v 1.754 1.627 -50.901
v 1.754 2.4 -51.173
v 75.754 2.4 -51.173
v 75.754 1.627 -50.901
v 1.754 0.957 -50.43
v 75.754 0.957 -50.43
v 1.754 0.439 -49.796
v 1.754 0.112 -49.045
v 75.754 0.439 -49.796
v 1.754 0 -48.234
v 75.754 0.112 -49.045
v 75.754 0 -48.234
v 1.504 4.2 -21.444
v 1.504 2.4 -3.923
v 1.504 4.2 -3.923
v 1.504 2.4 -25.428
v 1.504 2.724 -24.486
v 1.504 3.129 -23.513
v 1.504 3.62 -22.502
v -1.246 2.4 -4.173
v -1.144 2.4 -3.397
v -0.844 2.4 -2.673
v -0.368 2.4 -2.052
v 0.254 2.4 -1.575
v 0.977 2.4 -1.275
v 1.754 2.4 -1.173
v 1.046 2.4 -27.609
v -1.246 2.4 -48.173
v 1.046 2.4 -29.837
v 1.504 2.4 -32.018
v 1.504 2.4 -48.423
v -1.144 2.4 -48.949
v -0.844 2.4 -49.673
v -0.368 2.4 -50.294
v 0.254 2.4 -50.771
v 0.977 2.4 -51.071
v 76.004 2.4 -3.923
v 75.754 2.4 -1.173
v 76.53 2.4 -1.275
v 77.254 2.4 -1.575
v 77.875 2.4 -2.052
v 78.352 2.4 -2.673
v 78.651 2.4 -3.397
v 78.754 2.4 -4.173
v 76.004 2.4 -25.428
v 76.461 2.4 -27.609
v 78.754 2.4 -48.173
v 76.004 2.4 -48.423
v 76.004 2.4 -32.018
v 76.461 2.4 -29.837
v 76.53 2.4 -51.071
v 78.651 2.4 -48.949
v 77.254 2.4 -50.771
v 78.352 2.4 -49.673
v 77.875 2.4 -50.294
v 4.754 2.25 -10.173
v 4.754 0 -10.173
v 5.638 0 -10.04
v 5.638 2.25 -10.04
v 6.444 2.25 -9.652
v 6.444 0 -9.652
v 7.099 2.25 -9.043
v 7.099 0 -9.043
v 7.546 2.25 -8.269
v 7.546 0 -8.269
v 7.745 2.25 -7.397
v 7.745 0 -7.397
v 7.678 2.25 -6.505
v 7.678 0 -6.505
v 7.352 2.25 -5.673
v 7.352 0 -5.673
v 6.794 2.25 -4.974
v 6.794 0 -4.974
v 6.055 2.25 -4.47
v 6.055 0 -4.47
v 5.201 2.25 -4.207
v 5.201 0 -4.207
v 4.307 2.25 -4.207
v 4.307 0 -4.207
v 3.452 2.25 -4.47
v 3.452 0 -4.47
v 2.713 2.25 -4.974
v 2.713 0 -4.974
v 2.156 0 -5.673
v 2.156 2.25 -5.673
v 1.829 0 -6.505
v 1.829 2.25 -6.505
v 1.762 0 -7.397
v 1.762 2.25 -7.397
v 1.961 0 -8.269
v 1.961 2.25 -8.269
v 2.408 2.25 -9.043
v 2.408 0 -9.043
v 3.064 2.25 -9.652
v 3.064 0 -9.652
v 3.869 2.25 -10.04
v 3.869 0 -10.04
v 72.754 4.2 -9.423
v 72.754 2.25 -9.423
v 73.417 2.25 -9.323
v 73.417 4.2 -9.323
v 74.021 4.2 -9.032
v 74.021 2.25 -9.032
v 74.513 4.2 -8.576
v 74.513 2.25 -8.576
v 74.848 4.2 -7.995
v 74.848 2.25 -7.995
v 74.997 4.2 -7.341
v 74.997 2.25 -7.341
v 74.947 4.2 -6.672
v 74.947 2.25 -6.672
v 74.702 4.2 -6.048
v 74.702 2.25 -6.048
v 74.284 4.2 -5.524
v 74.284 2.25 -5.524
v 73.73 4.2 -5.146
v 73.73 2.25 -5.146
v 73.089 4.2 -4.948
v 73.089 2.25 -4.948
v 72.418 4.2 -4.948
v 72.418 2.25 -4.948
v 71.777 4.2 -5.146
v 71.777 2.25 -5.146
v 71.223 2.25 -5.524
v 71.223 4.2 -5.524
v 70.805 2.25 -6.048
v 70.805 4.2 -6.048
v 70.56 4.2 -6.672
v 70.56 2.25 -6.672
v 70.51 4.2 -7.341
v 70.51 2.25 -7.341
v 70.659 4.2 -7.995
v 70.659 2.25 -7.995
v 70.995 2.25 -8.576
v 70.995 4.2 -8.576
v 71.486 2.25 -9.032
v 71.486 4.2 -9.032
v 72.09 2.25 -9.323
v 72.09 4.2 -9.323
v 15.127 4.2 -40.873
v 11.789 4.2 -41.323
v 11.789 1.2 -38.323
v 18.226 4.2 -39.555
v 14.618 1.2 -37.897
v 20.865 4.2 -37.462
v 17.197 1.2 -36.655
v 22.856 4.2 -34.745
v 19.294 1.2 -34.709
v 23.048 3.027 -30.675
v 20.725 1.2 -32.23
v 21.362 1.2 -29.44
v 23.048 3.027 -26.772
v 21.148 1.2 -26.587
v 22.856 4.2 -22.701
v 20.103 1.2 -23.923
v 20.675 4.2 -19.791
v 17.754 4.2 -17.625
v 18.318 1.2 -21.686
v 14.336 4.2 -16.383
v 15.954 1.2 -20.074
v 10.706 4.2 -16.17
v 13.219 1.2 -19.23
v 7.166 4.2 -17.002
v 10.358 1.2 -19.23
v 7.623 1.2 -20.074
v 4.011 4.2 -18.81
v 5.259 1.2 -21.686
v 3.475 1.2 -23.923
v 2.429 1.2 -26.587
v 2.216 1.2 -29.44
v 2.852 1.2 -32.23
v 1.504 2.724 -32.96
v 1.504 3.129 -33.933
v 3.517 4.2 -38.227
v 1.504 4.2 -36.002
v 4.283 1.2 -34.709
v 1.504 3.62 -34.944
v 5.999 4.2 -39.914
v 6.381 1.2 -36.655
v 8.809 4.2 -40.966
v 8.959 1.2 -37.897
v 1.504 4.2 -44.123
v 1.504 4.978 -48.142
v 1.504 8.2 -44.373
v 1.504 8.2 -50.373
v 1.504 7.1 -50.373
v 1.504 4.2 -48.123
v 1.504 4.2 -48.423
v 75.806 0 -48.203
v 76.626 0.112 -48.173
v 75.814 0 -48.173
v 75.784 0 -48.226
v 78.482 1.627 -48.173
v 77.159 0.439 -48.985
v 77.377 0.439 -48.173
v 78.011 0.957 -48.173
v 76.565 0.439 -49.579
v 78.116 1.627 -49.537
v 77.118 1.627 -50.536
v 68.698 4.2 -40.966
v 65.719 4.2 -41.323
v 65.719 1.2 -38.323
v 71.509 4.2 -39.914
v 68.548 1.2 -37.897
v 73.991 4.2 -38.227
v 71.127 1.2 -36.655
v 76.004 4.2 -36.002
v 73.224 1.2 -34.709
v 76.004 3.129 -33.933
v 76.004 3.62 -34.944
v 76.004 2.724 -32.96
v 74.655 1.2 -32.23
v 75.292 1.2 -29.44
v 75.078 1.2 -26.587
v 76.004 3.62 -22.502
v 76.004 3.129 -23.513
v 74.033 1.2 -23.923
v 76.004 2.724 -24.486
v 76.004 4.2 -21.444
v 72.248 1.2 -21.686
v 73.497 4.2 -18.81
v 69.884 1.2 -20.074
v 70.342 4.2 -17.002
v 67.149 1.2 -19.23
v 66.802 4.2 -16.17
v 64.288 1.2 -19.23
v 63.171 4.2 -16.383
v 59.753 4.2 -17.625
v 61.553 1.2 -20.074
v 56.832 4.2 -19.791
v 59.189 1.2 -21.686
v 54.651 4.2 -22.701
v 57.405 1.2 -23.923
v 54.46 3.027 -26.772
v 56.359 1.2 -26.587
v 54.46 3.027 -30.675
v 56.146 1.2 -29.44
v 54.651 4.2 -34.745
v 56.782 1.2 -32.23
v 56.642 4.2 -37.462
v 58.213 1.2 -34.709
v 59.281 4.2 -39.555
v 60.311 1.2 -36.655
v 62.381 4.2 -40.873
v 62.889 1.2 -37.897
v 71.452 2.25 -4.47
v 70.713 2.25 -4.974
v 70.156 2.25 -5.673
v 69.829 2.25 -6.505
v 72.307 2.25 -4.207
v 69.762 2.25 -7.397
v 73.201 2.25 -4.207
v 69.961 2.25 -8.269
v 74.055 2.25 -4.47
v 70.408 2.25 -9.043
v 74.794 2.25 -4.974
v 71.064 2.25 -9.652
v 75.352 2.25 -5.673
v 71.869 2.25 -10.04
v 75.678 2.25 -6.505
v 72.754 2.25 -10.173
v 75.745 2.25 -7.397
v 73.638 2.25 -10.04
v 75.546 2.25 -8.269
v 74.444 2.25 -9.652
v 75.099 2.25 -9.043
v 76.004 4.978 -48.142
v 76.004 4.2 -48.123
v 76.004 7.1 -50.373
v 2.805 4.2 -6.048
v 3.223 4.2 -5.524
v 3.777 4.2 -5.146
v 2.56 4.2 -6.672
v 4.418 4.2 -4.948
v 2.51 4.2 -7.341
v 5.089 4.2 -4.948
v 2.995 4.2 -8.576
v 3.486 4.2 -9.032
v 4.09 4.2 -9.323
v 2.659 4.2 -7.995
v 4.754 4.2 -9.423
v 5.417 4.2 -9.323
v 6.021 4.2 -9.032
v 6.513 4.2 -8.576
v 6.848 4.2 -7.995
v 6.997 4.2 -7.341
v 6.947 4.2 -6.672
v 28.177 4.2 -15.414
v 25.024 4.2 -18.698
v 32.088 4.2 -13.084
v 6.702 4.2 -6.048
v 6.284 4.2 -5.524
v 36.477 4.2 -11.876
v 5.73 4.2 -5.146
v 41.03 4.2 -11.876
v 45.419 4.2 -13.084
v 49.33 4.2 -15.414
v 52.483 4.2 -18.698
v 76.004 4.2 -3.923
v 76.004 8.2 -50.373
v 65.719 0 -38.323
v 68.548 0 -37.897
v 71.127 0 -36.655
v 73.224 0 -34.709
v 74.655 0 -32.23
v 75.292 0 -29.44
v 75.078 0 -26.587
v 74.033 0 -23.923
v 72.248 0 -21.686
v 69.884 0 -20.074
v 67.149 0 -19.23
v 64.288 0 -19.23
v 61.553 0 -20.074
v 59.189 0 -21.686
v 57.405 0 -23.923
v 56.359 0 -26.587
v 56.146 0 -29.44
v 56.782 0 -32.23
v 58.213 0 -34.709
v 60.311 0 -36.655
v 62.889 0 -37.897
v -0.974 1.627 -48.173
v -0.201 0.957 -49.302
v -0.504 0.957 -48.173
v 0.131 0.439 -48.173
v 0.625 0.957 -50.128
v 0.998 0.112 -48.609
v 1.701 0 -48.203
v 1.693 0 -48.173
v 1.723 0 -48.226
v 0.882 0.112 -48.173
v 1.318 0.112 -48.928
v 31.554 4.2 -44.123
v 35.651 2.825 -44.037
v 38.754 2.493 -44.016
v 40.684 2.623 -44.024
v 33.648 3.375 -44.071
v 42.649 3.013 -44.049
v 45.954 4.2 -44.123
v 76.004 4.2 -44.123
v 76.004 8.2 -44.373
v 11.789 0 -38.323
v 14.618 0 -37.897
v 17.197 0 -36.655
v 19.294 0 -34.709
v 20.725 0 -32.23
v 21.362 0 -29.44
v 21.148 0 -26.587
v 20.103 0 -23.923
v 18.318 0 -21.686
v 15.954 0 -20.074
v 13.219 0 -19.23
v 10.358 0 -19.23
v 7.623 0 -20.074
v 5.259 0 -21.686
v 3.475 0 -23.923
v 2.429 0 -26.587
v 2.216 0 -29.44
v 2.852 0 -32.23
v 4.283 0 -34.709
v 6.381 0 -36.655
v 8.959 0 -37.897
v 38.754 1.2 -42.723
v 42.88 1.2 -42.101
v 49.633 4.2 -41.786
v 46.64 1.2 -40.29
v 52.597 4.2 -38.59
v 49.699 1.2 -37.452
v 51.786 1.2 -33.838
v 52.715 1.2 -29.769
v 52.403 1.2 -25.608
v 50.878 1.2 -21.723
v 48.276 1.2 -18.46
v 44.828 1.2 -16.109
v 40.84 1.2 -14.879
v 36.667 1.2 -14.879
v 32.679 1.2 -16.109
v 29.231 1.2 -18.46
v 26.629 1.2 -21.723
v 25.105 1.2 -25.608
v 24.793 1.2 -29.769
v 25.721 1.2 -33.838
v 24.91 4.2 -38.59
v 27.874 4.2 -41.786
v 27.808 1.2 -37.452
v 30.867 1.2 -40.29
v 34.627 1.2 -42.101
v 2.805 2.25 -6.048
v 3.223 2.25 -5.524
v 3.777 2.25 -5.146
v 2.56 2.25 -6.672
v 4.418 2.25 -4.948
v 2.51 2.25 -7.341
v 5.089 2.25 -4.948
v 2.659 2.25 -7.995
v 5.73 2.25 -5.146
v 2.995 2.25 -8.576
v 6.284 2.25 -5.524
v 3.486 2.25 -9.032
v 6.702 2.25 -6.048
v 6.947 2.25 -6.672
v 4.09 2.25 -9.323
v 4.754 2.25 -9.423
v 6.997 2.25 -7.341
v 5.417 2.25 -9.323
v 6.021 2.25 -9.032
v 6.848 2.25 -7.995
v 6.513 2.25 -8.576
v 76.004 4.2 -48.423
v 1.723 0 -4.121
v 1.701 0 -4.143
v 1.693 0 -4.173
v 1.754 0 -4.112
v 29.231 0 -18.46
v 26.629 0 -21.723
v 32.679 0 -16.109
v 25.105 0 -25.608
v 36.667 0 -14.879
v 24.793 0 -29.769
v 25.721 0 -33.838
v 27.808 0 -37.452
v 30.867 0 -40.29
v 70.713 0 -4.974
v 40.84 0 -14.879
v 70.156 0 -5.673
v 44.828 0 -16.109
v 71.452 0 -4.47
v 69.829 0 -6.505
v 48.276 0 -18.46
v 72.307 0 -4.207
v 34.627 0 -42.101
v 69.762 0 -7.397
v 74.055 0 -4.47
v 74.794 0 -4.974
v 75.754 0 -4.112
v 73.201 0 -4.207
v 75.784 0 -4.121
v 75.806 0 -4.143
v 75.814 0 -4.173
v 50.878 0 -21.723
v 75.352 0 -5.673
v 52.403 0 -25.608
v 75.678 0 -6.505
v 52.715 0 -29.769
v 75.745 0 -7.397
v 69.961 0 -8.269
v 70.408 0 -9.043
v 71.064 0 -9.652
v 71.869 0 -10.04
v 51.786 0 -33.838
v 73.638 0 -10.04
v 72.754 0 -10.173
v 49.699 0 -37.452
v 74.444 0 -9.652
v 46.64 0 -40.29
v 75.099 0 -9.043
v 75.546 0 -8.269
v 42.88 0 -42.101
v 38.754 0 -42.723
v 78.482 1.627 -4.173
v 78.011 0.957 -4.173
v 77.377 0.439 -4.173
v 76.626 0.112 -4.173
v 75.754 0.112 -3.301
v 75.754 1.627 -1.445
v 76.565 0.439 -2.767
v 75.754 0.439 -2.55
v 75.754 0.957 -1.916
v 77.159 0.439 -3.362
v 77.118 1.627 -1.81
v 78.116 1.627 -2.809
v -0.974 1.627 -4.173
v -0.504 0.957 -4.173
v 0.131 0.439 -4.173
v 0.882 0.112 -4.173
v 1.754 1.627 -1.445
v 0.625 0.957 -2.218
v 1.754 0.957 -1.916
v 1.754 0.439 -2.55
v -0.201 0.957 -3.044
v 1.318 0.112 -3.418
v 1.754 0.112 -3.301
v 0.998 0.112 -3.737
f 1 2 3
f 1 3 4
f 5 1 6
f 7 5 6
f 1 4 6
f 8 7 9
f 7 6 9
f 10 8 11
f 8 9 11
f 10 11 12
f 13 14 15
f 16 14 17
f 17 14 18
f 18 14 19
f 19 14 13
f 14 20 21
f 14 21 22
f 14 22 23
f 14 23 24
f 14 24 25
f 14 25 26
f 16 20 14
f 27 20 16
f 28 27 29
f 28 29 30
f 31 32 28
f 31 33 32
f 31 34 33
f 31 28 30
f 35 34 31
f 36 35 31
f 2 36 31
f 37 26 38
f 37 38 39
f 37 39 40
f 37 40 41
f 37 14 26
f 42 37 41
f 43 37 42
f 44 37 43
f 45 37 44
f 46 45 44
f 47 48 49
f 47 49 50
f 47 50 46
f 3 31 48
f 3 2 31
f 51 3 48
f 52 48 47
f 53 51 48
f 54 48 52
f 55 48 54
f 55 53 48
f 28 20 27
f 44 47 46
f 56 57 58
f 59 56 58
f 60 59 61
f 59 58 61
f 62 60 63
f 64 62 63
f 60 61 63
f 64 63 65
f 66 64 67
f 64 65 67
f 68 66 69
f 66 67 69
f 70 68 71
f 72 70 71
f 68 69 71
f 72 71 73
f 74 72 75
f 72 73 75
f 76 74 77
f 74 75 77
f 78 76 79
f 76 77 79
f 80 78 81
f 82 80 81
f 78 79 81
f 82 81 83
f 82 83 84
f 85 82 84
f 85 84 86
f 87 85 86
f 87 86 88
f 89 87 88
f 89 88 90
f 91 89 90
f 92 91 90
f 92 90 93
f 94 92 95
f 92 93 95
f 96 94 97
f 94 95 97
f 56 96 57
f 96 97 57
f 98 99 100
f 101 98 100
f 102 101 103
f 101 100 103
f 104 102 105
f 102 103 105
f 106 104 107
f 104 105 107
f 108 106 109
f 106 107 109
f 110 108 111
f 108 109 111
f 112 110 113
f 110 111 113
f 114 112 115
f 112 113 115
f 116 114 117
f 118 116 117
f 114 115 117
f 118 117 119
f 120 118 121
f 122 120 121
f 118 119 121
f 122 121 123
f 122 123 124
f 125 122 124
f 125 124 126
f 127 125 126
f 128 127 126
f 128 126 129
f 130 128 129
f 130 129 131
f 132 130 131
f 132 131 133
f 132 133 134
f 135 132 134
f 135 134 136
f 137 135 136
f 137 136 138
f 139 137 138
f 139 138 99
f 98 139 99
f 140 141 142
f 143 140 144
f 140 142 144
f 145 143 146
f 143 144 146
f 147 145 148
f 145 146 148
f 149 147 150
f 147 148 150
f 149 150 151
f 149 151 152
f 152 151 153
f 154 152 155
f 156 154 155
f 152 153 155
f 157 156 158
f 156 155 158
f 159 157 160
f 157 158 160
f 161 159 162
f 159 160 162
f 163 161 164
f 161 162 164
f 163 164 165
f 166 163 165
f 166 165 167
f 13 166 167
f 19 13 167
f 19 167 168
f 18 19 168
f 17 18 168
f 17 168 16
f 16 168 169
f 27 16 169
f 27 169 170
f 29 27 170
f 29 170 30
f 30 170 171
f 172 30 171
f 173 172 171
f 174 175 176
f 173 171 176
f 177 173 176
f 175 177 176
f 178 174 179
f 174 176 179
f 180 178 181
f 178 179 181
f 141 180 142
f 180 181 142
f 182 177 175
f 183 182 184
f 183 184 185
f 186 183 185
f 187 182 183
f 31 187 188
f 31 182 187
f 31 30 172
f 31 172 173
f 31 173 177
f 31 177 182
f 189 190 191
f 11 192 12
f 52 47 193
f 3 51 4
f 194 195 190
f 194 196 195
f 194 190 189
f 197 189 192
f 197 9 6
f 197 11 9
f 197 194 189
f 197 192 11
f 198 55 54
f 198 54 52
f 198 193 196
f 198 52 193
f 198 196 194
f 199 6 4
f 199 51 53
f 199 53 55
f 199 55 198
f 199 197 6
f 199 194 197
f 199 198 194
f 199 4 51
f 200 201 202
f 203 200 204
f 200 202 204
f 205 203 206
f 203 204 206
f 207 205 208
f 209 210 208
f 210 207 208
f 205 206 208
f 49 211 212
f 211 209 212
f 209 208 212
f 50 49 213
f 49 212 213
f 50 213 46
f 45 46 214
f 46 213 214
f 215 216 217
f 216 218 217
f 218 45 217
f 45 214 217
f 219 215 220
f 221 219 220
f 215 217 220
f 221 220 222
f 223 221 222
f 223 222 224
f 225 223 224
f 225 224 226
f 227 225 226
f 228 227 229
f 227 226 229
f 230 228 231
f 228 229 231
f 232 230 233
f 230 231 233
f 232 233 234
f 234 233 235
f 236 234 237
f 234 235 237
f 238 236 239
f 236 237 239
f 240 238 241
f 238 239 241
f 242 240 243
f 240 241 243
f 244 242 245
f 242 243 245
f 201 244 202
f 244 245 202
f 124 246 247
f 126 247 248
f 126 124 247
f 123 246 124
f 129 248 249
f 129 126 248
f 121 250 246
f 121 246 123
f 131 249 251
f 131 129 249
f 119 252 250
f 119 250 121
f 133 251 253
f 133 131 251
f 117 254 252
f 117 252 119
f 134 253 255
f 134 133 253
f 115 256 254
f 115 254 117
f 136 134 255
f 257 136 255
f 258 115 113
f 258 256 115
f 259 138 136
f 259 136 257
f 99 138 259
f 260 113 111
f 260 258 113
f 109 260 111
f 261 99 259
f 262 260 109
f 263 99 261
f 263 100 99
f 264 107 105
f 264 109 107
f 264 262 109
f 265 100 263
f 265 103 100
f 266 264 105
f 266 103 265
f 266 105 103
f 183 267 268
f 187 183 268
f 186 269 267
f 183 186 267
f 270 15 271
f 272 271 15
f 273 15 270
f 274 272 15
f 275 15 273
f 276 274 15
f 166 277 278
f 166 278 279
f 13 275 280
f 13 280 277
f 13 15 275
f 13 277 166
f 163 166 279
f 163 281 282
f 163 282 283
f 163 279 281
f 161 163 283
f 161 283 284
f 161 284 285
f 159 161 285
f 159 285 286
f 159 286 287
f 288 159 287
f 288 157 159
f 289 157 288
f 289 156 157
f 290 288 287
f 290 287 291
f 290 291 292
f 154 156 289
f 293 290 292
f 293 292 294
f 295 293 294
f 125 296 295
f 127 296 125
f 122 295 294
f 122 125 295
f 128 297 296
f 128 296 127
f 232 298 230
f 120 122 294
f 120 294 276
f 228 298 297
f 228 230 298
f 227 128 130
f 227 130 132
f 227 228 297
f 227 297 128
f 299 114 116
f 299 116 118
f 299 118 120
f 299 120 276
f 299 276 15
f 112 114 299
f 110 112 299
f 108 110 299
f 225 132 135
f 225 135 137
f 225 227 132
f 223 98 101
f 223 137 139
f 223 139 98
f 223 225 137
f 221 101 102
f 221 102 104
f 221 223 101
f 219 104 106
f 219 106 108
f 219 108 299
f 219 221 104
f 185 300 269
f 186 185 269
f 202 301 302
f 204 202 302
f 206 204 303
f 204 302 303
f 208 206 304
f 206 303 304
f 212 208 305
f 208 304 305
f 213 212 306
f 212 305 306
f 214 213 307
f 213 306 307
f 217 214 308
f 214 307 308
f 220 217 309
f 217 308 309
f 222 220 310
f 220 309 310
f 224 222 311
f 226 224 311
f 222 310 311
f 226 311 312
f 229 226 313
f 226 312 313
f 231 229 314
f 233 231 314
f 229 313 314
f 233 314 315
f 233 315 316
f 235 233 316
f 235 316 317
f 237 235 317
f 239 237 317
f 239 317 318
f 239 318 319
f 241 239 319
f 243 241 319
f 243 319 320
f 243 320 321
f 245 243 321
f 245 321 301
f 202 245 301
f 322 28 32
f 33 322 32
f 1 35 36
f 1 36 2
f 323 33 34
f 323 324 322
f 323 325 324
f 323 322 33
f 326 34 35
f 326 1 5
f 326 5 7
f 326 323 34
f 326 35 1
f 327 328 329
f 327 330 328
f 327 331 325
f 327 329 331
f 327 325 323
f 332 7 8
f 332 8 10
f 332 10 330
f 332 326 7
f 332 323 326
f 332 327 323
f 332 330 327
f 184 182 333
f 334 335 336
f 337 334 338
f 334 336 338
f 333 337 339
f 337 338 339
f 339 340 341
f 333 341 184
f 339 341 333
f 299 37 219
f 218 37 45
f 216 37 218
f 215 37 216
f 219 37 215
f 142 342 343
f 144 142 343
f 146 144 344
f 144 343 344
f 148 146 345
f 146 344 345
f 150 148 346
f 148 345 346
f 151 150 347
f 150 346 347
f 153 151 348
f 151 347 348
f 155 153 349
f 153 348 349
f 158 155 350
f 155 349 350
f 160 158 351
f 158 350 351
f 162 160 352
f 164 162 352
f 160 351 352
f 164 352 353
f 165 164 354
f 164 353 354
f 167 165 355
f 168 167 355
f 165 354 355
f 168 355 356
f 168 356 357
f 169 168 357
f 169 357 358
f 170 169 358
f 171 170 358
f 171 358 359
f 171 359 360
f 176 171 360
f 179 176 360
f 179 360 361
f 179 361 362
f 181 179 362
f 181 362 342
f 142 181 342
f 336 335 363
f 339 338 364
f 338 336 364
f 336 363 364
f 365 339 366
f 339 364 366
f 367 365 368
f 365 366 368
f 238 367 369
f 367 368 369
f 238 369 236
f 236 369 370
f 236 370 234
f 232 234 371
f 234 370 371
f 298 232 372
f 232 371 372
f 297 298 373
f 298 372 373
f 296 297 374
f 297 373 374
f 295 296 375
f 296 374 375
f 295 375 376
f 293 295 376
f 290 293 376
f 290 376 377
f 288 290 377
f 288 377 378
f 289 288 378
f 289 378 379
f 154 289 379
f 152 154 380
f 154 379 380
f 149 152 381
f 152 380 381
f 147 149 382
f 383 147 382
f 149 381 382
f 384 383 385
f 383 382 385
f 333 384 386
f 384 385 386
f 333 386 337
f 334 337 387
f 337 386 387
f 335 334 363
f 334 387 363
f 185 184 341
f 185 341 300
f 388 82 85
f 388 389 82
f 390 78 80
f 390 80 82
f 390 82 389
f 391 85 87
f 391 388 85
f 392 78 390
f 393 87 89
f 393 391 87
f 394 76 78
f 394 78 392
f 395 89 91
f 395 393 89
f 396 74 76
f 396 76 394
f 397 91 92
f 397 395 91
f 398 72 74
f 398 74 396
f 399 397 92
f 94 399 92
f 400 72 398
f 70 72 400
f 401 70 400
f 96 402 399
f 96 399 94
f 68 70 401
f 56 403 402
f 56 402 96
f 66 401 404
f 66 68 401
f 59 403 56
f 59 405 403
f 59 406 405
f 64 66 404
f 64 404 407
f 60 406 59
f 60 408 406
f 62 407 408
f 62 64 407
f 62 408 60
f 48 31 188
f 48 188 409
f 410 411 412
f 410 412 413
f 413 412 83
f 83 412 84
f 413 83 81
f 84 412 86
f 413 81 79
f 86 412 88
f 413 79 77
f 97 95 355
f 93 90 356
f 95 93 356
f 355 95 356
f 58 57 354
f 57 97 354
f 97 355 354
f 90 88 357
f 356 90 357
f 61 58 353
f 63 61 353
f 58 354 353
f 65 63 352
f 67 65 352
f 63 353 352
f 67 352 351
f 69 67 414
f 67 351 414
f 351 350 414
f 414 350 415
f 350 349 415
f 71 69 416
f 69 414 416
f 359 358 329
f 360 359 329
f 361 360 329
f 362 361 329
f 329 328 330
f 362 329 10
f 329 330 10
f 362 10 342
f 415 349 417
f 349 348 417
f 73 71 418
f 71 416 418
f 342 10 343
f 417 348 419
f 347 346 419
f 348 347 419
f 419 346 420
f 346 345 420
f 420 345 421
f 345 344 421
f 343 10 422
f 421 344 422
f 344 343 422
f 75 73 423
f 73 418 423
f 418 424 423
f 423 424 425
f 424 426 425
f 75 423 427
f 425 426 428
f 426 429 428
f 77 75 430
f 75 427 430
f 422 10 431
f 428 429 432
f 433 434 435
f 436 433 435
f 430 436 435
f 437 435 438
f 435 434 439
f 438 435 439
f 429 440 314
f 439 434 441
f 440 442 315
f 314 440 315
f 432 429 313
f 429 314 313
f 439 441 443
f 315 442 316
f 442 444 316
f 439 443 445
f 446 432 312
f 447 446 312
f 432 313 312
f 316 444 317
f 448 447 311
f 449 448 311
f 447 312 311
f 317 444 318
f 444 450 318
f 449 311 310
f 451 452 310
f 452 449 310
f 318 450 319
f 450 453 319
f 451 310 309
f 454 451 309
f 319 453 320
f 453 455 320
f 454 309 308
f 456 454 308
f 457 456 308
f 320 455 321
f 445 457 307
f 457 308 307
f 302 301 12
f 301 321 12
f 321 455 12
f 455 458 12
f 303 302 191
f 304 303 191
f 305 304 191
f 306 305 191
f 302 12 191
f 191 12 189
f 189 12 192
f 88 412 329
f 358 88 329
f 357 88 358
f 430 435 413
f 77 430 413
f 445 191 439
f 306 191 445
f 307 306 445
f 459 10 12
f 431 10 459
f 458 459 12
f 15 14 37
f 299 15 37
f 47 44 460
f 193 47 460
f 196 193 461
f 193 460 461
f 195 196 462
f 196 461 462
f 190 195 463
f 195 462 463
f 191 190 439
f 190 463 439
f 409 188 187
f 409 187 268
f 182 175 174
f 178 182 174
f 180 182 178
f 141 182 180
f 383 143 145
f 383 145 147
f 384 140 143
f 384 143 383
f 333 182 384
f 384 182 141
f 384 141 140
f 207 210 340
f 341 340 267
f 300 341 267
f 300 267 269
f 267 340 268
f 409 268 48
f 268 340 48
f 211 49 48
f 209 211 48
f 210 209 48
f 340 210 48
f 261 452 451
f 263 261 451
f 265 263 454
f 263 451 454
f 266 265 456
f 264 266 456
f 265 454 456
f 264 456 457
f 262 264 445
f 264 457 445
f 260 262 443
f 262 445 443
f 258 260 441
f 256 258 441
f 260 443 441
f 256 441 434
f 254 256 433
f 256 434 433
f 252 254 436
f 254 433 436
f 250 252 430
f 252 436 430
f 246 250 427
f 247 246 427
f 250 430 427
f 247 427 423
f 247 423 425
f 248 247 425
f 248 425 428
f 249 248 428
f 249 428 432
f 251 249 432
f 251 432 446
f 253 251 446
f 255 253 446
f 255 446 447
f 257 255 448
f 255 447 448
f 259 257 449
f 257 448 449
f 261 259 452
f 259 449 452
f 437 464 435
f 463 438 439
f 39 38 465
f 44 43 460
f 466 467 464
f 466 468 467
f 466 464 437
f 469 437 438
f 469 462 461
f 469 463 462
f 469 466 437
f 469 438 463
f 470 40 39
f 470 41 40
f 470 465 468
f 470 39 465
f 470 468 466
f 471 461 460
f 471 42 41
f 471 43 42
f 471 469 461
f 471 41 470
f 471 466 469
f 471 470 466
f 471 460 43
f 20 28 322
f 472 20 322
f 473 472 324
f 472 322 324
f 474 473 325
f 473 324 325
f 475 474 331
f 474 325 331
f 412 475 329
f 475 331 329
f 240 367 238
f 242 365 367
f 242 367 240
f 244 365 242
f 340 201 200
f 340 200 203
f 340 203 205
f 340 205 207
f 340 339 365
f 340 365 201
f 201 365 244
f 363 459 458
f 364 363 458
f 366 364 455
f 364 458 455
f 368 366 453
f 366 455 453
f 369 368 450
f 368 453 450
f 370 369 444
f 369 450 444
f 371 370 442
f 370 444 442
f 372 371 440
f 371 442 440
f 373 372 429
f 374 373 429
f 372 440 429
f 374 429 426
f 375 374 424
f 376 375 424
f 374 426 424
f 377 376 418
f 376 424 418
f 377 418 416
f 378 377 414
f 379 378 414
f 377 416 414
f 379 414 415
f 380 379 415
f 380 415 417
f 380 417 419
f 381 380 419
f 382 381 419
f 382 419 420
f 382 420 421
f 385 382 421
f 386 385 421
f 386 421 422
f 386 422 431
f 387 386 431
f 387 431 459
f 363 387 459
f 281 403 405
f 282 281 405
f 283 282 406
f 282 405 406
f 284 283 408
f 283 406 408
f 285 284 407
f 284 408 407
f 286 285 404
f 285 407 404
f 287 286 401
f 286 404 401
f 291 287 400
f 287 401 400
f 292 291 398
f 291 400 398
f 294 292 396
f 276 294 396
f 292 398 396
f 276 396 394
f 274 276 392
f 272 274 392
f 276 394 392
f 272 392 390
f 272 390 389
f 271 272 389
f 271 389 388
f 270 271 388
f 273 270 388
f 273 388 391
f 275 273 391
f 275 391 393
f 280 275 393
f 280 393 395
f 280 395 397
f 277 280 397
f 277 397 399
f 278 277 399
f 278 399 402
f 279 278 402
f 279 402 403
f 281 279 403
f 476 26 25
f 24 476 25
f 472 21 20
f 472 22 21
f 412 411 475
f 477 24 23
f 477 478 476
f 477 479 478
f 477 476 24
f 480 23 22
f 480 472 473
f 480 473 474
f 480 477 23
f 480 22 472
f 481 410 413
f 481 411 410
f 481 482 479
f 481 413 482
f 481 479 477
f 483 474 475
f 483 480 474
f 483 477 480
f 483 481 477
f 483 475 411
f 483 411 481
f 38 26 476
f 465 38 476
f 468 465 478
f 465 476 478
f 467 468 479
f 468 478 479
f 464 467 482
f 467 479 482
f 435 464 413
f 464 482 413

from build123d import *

# Parameters (mm, degrees)
SKETCH1_W           = 80
SKETCH1_H           = 50
BOSS_EXTRUDE1_DEPTH = 2.4
SKETCH2_W           = 74.5
SKETCH2_H           = 44.5
BOSS_EXTRUDE2_DEPTH = 1.8
SKETCH4_R           = 9.6
SKETCH4_R_2         = 14
SKETCH4_R_3         = 2.25
CUT_EXTRUDE1_DEPTH  = 95.013072971
BOSS_EXTRUDE3_DEPTH = 74.5
FILLET1_R           = 3
FILLET2_R           = 3
SKETCH7_R           = 3
CUT_EXTRUDE3_DEPTH  = 2.25
CHAMFER1_SIZE       = 3


with BuildPart() as part:
    # Sketch1 → Boss-Extrude1 (new body)
    with BuildSketch(Plane(origin=(0, 0, 0), x_dir=(1, 0, 0), z_dir=(0, 1, 0))):
        with Locations((38.753665689, 26.173020528)):
            Rectangle(SKETCH1_W, SKETCH1_H)
    extrude(amount=BOSS_EXTRUDE1_DEPTH)

    # Sketch2 → Boss-Extrude2 (add)
    with BuildSketch(Plane(origin=(0, 2.4, 0), x_dir=(1, 0, 0), z_dir=(0, 1, 0))):
        with Locations((38.753665689, 26.173020528)):
            Rectangle(SKETCH2_W, SKETCH2_H)
    extrude(amount=BOSS_EXTRUDE2_DEPTH)

    # Sketch4 → Cut-Extrude1 (cut, through all)
    with BuildSketch(Plane(origin=(0, 0, 0), x_dir=(-1, 0, 0), z_dir=(0, -1, 0))):
        with Locations(Location((-65.718665689, 28.723020528, 0), (0, 0, 90))):
            Circle(SKETCH4_R)
        with Locations(Location((-38.753665689, 28.723020528, 0), (0, 0, 90))):
            Circle(SKETCH4_R_2)
        with Locations(Location((-11.788665689, 28.723020528, 0), (0, 0, 90))):
            Circle(SKETCH4_R)
        with Locations(Location((-72.753665689, 7.173020528, 0), (0, 0, 90))):
            Circle(SKETCH4_R_3)
        with Locations(Location((-4.753665689, 7.173020528, 0), (0, 0, 90))):
            Circle(SKETCH4_R_3)
    extrude(amount=-CUT_EXTRUDE1_DEPTH, mode=Mode.SUBTRACT)

    # Sketch5 → Boss-Extrude3 (add)
    with BuildSketch(Plane(origin=(76.003665689, 0, 0), x_dir=(0, 0, -1), z_dir=(1, 0, 0))):
        Polygon((48.123020528, 4.2), (44.123020528, 4.2), (44.373020528, 8.2), (50.373020528, 8.2), (50.373020528, 7.1), (48.142477117, 4.978263585), align=None)
    extrude(amount=-BOSS_EXTRUDE3_DEPTH)

    # Fillet1
    fillet1_edges = [part.edges().sort_by_distance(p)[0] for p in [
        (-1.246334311, 1.2, -51.173020528),
        (78.753665689, 1.2, -51.173020528),
        (78.753665689, 1.2, -1.173020528),
        (-1.246334311, 1.2, -1.173020528),
    ]]
    fillet(fillet1_edges, radius=FILLET1_R)

    # Fillet2
    # the kernel refuses this fillet: 3 mm, written as the material it takes off along each edge
    with BuildSketch(Plane(origin=(1.753665689, 0, -48.173020528), x_dir=(-1, 0, 0), z_dir=(0, 0, 1))) as fillet2_piece_1:
        with BuildLine():
            CenterArc((0.060612309, -3), FILLET2_R, 11.536959033, 78.463040967)
            Line((3, -2.4), (3.058787754, -2.388))
            ThreePointArc((3.058787754, -2.388), (3.06, -1.2), (3.06, 0))
            Line((3.06, 0), (3, 0.06))
            Line((3, 0.06), (0.060612309, 0.06))
            Line((0.060612309, 0.06), (0.060612309, 0))
        make_face()
    revolve(axis=Axis((1.753665689, 0, -48.173020528), (0, -1, 0)), revolution_arc=90, mode=Mode.SUBTRACT)
    with BuildSketch(Plane(origin=(75.753665689, 0, -51.173020528), x_dir=(0, 0, 1), z_dir=(-1, 0, 0))) as fillet2_piece_2:
        with BuildLine():
            CenterArc((2.939387691, 3), FILLET2_R, 191.536959033, 78.463040967)
            Line((0, 2.4), (-0.058787754, 2.388))
            ThreePointArc((-0.058787754, 2.388), (-0.06, 1.2), (-0.06, 0))
            Line((-0.06, 0), (0, -0.06))
            Line((0, -0.06), (2.939387691, -0.06))
            Line((2.939387691, -0.06), (2.939387691, 0))
        make_face()
    extrude(amount=74, mode=Mode.SUBTRACT)
    with BuildSketch(Plane(origin=(75.753665689, 0, -48.173020528), x_dir=(1, 0, 0), z_dir=(0, 0, 1))) as fillet2_piece_3:
        with BuildLine():
            CenterArc((0.060612309, 3), FILLET2_R, 270, 78.463040967)
            Line((3, 2.4), (3.058787754, 2.388))
            ThreePointArc((3.058787754, 2.388), (3.06, 1.2), (3.06, 0))
            Line((3.06, 0), (3, -0.06))
            Line((3, -0.06), (0.060612309, -0.06))
            Line((0.060612309, -0.06), (0.060612309, 0))
        make_face()
    revolve(axis=Axis((75.753665689, 0, -48.173020528), (0, 1, 0)), revolution_arc=90, mode=Mode.SUBTRACT)
    with BuildSketch(Plane(origin=(78.753665689, 0, -4.173020528), x_dir=(-1, 0, 0), z_dir=(0, 0, -1)), Plane(origin=(-1.246334311, 0, -48.173020528), x_dir=(1, 0, 0), z_dir=(0, 0, 1))) as fillet2_piece_4:
        with BuildLine():
            CenterArc((2.939387691, 3), FILLET2_R, 191.536959033, 78.463040967)
            Line((0, 2.4), (-0.058787754, 2.388))
            ThreePointArc((-0.058787754, 2.388), (-0.06, 1.2), (-0.06, 0))
            Line((-0.06, 0), (0, -0.06))
            Line((0, -0.06), (2.939387691, -0.06))
            Line((2.939387691, -0.06), (2.939387691, 0))
        make_face()
    extrude(amount=44, mode=Mode.SUBTRACT)
    with BuildSketch(Plane(origin=(75.753665689, 0, -4.173020528), x_dir=(0, 0, 1), z_dir=(-1, 0, 0))) as fillet2_piece_5:
        with BuildLine():
            CenterArc((0.060612309, 3), FILLET2_R, 270, 78.463040967)
            Line((3, 2.4), (3.058787754, 2.388))
            ThreePointArc((3.058787754, 2.388), (3.06, 1.2), (3.06, 0))
            Line((3.06, 0), (3, -0.06))
            Line((3, -0.06), (0.060612309, -0.06))
            Line((0.060612309, -0.06), (0.060612309, 0))
        make_face()
    revolve(axis=Axis((75.753665689, 0, -4.173020528), (0, 1, 0)), revolution_arc=90, mode=Mode.SUBTRACT)
    with BuildSketch(Plane(origin=(1.753665689, 0, -1.173020528), x_dir=(0, 1.0, -1.5658770576478976e-12), z_dir=(1, 0, 0))) as fillet2_piece_6:
        with BuildLine():
            CenterArc((3, -2.939387691), FILLET2_R, 101.536959033, 78.463040967)
            Line((0, -2.939387691), (-0.06, -2.939387691))
            Line((-0.06, -2.939387691), (-0.06, 0))
            Line((-0.06, 0), (0, 0.06))
            ThreePointArc((0, 0.06), (1.2, 0.06), (2.388, 0.058787754))
            Line((2.388, 0.058787754), (2.4, 0))
        make_face()
    extrude(amount=74, mode=Mode.SUBTRACT)
    with BuildSketch(Plane(origin=(1.753665689, 0, -4.173020528), x_dir=(0, 0, 1), z_dir=(1, 0, 0))) as fillet2_piece_7:
        with BuildLine():
            CenterArc((0.060612309, -3), FILLET2_R, 11.536959033, 78.463040967)
            Line((3, -2.4), (3.058787754, -2.388))
            ThreePointArc((3.058787754, -2.388), (3.06, -1.2), (3.06, 0))
            Line((3.06, 0), (3, 0.06))
            Line((3, 0.06), (0.060612309, 0.06))
            Line((0.060612309, 0.06), (0.060612309, 0))
        make_face()
    revolve(axis=Axis((1.753665689, 0, -4.173020528), (0, -1, 0)), revolution_arc=90, mode=Mode.SUBTRACT)

    # Sketch7 → Cut-Extrude3 (cut)
    with BuildSketch(Plane.XZ):
        with Locations(Location((4.753665689, -7.173020528, 0), (0, 0, 270))):
            Circle(SKETCH7_R)
        with Locations(Location((72.753665689, -7.173020528, 0), (0, 0, 270))):
            Circle(SKETCH7_R)
    extrude(amount=-CUT_EXTRUDE3_DEPTH, mode=Mode.SUBTRACT)

    # Chamfer1
    # the kernel refuses this chamfer: 3 mm, written as the material it takes off along each edge
    with BuildSketch(Plane(origin=(11.788665689, 4.2, -28.723020528), x_dir=(0, 0, -1), z_dir=(-1, 0, 0))) as chamfer1_piece_1:
        Polygon((9.6 + CHAMFER1_SIZE, 0), (9.6, CHAMFER1_SIZE), (9.6, 0), align=None)
    revolve(axis=Axis((11.788665689, 4.2, -28.723020528), (0, -1, 0)), mode=Mode.SUBTRACT)
    with BuildSketch(Plane(origin=(38.753665689, 4.2, -28.723020528), x_dir=(0, 0, -1), z_dir=(-1, 0, 0))) as chamfer1_piece_2_section:
        Polygon((14 + CHAMFER1_SIZE, 0), (14, CHAMFER1_SIZE), (14, 0), align=None)
    chamfer1_piece_2 = revolve(axis=Axis((38.753665689, 4.2, -28.723020528), (0, -1, 0)), mode=Mode.PRIVATE)
    chamfer1_piece_2 = split(chamfer1_piece_2, bisect_by=Plane(origin=(38.753665689, 0.839630842, -43.912997455), z_dir=(0, 0.06237828615517877, 0.9980525784828888)), keep=Keep.TOP, mode=Mode.PRIVATE)
    add(chamfer1_piece_2, mode=Mode.SUBTRACT)
    with BuildSketch(Plane(origin=(65.718665689, 4.2, -28.723020528), x_dir=(0, 0, -1), z_dir=(-1, 0, 0))) as chamfer1_piece_3:
        Polygon((9.6 + CHAMFER1_SIZE, 0), (9.6, CHAMFER1_SIZE), (9.6, 0), align=None)
    revolve(axis=Axis((65.718665689, 4.2, -28.723020528), (0, -1, 0)), mode=Mode.SUBTRACT)


solid = part.part
